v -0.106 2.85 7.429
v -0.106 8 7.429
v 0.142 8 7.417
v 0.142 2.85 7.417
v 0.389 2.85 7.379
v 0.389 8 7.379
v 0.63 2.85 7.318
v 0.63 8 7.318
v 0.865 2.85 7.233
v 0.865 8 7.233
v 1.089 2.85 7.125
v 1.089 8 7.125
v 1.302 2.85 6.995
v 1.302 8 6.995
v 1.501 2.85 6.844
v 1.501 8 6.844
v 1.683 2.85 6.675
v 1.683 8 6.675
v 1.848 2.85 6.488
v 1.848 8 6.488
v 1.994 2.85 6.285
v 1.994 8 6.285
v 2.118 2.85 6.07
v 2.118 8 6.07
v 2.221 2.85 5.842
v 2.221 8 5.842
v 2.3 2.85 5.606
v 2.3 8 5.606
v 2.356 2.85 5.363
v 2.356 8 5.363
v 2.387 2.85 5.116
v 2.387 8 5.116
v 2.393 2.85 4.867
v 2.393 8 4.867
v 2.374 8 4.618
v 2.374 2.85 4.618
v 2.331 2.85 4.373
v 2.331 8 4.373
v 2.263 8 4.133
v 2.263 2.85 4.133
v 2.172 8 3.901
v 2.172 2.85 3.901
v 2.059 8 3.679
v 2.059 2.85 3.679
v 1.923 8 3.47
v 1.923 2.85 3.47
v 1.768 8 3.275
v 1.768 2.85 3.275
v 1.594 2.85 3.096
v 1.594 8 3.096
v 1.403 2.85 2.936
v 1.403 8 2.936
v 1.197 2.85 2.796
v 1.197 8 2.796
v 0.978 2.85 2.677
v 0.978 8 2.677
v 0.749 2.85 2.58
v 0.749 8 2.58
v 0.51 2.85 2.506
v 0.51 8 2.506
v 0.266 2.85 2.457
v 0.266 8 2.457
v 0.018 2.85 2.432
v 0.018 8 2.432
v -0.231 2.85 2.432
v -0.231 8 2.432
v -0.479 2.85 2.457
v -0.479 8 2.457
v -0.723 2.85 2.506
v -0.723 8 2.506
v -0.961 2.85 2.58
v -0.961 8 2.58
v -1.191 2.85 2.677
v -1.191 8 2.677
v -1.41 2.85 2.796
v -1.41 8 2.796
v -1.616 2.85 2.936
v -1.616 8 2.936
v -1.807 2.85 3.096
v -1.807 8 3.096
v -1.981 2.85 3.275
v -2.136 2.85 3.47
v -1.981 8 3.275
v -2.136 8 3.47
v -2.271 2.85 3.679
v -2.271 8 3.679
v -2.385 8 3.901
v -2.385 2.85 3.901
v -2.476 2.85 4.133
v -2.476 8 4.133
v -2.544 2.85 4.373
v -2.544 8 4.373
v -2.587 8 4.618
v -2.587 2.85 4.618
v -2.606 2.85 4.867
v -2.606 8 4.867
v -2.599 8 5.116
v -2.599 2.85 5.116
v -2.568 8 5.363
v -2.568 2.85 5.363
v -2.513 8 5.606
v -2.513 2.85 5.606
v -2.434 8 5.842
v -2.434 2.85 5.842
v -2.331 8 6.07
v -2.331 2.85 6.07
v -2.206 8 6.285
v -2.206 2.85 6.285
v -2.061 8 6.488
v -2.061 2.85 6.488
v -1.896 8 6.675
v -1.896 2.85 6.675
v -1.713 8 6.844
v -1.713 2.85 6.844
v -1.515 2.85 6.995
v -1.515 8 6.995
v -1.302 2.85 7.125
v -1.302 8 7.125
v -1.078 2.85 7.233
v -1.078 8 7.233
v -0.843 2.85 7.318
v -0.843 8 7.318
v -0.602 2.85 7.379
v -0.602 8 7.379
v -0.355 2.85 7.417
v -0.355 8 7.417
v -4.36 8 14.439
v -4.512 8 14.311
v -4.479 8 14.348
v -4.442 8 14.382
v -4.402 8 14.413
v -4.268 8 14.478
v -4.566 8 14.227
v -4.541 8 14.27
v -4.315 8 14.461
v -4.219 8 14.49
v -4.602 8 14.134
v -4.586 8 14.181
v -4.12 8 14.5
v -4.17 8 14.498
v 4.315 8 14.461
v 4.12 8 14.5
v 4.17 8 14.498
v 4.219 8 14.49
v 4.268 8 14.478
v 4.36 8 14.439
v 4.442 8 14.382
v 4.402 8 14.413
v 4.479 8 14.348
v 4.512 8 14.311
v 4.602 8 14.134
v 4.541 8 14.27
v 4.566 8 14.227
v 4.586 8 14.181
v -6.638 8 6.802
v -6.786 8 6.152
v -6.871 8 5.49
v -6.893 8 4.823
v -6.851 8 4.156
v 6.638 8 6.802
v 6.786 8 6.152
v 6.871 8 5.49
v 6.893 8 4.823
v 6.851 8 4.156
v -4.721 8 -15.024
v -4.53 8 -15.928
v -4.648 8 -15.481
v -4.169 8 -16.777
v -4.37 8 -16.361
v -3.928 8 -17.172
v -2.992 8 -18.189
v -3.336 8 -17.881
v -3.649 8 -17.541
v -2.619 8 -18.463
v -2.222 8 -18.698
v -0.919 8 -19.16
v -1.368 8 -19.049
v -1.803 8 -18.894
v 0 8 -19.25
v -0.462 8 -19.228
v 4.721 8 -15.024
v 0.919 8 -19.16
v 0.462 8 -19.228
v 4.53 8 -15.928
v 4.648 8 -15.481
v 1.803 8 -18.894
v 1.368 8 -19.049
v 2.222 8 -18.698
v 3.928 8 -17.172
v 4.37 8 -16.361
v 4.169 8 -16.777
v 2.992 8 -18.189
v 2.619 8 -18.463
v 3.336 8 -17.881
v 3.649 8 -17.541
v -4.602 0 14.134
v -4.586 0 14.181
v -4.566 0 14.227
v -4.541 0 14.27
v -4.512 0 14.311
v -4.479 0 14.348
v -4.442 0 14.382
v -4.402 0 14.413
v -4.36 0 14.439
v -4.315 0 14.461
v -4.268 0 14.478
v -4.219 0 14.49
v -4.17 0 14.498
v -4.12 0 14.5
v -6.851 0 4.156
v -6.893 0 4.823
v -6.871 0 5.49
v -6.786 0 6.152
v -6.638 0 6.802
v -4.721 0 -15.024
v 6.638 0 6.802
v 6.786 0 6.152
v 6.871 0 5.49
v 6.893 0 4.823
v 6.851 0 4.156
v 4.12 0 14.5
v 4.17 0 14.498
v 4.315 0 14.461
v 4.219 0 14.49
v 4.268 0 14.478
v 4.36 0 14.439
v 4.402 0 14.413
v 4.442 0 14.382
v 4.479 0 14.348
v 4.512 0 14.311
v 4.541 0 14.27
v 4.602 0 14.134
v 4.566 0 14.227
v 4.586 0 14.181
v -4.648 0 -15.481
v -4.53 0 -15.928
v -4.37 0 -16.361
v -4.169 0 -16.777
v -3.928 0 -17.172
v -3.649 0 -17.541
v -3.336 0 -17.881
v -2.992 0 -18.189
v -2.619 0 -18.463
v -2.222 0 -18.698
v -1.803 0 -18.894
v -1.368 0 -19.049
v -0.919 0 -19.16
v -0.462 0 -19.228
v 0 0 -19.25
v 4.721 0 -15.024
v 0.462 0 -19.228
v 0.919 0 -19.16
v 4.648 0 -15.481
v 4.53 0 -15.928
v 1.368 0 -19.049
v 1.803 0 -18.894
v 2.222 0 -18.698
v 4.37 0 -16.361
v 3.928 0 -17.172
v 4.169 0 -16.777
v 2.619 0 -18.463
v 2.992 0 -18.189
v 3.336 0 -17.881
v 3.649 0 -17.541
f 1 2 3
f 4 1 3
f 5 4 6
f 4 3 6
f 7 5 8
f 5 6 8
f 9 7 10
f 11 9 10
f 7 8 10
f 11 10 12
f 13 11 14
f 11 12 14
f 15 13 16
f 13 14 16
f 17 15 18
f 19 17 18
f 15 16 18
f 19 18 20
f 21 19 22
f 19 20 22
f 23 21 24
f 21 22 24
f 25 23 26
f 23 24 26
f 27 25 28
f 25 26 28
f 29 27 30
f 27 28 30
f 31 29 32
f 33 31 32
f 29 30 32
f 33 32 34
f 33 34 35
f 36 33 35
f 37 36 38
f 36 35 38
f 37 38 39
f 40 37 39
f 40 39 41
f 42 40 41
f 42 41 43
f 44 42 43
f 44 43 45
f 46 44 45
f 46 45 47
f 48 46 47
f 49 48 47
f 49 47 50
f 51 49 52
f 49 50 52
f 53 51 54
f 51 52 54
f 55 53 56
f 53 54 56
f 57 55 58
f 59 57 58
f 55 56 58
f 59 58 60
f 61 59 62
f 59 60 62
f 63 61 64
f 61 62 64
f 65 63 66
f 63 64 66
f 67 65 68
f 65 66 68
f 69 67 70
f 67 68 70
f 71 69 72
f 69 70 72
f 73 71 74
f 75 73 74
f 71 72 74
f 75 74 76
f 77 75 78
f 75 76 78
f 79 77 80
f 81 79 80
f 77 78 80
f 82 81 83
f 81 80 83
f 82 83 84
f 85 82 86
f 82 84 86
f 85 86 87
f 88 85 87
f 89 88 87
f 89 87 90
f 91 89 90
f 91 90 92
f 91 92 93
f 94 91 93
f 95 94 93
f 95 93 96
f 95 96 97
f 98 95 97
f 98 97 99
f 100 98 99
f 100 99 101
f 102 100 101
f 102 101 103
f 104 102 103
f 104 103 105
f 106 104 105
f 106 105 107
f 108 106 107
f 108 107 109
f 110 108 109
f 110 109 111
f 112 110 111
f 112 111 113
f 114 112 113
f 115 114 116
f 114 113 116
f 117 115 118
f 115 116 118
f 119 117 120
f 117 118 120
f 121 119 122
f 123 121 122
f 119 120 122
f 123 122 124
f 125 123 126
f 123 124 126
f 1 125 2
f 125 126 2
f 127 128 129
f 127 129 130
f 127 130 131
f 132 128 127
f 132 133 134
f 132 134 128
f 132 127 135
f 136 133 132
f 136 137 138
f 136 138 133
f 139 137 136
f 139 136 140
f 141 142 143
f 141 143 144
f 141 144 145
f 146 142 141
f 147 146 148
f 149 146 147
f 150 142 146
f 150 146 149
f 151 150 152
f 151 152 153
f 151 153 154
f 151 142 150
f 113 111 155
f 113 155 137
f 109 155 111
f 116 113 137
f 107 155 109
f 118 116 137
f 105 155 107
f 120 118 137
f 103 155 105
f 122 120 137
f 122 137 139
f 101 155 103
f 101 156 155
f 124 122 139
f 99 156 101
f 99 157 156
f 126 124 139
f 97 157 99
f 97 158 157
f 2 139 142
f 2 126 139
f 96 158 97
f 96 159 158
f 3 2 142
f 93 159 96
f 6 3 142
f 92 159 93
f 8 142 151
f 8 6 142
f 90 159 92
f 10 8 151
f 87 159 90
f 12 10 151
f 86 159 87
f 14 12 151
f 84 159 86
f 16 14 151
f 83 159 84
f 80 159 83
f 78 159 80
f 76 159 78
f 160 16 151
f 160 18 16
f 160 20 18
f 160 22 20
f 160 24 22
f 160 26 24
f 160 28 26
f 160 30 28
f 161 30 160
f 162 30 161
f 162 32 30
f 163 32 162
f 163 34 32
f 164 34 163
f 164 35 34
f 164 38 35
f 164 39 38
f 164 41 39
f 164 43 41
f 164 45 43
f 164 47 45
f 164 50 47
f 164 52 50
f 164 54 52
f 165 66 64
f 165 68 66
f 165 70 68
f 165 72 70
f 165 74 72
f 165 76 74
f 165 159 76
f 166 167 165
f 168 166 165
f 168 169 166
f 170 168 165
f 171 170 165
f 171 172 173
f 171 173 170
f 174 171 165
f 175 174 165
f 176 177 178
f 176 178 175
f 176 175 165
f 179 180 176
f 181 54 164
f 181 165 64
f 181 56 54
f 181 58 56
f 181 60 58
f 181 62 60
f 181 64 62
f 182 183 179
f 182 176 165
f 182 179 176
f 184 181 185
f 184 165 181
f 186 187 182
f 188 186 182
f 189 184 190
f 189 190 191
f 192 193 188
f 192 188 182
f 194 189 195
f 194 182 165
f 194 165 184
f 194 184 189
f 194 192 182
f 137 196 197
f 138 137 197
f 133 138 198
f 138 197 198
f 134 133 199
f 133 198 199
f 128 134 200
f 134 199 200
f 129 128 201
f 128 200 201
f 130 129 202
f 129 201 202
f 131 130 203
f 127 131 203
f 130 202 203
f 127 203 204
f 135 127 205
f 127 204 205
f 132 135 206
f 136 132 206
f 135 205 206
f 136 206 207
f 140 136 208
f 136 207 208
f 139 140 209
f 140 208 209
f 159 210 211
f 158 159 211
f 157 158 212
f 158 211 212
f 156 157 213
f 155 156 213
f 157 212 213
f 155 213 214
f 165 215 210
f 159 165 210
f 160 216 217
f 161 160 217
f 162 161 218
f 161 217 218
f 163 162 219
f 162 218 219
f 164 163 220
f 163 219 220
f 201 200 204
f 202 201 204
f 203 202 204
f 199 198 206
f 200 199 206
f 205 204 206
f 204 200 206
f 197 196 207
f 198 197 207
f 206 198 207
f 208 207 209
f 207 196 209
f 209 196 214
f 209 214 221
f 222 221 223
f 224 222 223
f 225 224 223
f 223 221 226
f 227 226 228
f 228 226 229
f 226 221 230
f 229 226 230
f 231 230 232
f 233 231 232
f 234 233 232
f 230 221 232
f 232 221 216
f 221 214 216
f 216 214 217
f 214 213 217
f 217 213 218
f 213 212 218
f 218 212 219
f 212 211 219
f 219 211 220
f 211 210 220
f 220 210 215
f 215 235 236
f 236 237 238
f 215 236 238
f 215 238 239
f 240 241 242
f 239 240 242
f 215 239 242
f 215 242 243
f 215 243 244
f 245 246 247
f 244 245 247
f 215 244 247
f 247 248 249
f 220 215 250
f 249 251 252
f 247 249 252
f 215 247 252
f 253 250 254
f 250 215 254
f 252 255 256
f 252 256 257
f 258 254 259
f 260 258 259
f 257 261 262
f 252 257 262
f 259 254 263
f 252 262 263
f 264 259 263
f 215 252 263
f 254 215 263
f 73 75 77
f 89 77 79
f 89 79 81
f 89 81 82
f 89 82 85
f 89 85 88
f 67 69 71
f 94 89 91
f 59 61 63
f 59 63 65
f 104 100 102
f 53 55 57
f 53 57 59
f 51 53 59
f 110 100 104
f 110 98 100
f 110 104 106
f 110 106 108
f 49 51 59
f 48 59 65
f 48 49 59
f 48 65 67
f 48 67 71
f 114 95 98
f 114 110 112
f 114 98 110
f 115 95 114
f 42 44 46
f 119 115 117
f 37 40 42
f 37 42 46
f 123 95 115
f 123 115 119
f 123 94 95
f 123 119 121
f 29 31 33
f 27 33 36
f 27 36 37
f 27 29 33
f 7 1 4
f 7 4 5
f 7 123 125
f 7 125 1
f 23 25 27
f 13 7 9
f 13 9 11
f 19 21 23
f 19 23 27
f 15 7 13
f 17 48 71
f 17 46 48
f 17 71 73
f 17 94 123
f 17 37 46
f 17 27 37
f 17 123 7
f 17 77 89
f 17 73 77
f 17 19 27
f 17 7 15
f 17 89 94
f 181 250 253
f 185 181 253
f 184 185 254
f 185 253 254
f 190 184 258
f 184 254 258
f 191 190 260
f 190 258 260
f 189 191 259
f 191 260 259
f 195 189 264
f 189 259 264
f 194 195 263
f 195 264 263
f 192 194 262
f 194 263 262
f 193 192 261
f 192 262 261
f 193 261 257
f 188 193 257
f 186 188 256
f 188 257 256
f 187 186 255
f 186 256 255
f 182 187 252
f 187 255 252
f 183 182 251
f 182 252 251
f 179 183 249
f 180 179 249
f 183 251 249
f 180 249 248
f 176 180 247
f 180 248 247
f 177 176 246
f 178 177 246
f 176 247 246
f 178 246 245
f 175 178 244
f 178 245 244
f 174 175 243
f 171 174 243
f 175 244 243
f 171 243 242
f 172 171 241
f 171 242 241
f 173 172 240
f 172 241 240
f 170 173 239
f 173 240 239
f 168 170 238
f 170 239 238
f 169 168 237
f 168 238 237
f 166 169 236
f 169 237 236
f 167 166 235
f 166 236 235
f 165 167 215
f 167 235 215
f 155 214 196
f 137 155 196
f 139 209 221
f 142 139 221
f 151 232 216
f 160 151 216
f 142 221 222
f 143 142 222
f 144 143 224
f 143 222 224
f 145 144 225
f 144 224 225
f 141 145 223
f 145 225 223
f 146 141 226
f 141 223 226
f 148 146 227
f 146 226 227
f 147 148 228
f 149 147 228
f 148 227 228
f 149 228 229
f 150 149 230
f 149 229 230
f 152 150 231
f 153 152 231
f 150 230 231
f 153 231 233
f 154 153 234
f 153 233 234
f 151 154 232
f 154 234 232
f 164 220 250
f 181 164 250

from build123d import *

# Parameters (mm, degrees)
BOSS_EXTRUDE4_DEPTH = 8
SKETCH2_R           = 2.5
CUT_EXTRUDE1_DEPTH  = 5.15


with BuildPart() as part:
    # Sketch1 → Boss-Extrude4 (new body)
    with BuildSketch(Plane(origin=(0, 0, 0), x_dir=(1, 0, 0), z_dir=(0, 1, 0))):
        with BuildLine():
            Line((-4.119957175, -14.5), (4.119957175, -14.5))
            ThreePointArc((4.119957175, -14.5), (4.42252042, -14.398064672), (4.60171613, -14.133821932))
            Line((4.60171613, -14.133821932), (6.638196956, -6.80249096))
            ThreePointArc((6.638196956, -6.80249096), (6.871082847, -5.489641243), (6.850811782, -4.156449845))
            Line((6.850811782, -4.156449845), (4.720984417, 15.024219546))
            ThreePointArc((4.720984417, 15.024219546), (0, 19.25), (-4.720984417, 15.024219546))
            Line((-4.720984417, 15.024219546), (-6.850811782, -4.156449845))
            ThreePointArc((-6.850811782, -4.156449845), (-6.871082847, -5.489641243), (-6.638196956, -6.80249096))
            Line((-6.638196956, -6.80249096), (-4.60171613, -14.133821932))
            ThreePointArc((-4.60171613, -14.133821932), (-4.42252042, -14.398064672), (-4.119957175, -14.5))
        make_face()
    extrude(amount=BOSS_EXTRUDE4_DEPTH)

    # Sketch2 → Cut-Extrude1 (cut)
    with BuildSketch(Plane(origin=(0, 8, 0), x_dir=(1, 0, 0), z_dir=(0, 1, 0))):
        with Locations(Location((-0.106428412, -4.928983913, 0), (0, 0, 270))):
            Circle(SKETCH2_R)
    extrude(amount=-CUT_EXTRUDE1_DEPTH, mode=Mode.SUBTRACT)


solid = part.part
